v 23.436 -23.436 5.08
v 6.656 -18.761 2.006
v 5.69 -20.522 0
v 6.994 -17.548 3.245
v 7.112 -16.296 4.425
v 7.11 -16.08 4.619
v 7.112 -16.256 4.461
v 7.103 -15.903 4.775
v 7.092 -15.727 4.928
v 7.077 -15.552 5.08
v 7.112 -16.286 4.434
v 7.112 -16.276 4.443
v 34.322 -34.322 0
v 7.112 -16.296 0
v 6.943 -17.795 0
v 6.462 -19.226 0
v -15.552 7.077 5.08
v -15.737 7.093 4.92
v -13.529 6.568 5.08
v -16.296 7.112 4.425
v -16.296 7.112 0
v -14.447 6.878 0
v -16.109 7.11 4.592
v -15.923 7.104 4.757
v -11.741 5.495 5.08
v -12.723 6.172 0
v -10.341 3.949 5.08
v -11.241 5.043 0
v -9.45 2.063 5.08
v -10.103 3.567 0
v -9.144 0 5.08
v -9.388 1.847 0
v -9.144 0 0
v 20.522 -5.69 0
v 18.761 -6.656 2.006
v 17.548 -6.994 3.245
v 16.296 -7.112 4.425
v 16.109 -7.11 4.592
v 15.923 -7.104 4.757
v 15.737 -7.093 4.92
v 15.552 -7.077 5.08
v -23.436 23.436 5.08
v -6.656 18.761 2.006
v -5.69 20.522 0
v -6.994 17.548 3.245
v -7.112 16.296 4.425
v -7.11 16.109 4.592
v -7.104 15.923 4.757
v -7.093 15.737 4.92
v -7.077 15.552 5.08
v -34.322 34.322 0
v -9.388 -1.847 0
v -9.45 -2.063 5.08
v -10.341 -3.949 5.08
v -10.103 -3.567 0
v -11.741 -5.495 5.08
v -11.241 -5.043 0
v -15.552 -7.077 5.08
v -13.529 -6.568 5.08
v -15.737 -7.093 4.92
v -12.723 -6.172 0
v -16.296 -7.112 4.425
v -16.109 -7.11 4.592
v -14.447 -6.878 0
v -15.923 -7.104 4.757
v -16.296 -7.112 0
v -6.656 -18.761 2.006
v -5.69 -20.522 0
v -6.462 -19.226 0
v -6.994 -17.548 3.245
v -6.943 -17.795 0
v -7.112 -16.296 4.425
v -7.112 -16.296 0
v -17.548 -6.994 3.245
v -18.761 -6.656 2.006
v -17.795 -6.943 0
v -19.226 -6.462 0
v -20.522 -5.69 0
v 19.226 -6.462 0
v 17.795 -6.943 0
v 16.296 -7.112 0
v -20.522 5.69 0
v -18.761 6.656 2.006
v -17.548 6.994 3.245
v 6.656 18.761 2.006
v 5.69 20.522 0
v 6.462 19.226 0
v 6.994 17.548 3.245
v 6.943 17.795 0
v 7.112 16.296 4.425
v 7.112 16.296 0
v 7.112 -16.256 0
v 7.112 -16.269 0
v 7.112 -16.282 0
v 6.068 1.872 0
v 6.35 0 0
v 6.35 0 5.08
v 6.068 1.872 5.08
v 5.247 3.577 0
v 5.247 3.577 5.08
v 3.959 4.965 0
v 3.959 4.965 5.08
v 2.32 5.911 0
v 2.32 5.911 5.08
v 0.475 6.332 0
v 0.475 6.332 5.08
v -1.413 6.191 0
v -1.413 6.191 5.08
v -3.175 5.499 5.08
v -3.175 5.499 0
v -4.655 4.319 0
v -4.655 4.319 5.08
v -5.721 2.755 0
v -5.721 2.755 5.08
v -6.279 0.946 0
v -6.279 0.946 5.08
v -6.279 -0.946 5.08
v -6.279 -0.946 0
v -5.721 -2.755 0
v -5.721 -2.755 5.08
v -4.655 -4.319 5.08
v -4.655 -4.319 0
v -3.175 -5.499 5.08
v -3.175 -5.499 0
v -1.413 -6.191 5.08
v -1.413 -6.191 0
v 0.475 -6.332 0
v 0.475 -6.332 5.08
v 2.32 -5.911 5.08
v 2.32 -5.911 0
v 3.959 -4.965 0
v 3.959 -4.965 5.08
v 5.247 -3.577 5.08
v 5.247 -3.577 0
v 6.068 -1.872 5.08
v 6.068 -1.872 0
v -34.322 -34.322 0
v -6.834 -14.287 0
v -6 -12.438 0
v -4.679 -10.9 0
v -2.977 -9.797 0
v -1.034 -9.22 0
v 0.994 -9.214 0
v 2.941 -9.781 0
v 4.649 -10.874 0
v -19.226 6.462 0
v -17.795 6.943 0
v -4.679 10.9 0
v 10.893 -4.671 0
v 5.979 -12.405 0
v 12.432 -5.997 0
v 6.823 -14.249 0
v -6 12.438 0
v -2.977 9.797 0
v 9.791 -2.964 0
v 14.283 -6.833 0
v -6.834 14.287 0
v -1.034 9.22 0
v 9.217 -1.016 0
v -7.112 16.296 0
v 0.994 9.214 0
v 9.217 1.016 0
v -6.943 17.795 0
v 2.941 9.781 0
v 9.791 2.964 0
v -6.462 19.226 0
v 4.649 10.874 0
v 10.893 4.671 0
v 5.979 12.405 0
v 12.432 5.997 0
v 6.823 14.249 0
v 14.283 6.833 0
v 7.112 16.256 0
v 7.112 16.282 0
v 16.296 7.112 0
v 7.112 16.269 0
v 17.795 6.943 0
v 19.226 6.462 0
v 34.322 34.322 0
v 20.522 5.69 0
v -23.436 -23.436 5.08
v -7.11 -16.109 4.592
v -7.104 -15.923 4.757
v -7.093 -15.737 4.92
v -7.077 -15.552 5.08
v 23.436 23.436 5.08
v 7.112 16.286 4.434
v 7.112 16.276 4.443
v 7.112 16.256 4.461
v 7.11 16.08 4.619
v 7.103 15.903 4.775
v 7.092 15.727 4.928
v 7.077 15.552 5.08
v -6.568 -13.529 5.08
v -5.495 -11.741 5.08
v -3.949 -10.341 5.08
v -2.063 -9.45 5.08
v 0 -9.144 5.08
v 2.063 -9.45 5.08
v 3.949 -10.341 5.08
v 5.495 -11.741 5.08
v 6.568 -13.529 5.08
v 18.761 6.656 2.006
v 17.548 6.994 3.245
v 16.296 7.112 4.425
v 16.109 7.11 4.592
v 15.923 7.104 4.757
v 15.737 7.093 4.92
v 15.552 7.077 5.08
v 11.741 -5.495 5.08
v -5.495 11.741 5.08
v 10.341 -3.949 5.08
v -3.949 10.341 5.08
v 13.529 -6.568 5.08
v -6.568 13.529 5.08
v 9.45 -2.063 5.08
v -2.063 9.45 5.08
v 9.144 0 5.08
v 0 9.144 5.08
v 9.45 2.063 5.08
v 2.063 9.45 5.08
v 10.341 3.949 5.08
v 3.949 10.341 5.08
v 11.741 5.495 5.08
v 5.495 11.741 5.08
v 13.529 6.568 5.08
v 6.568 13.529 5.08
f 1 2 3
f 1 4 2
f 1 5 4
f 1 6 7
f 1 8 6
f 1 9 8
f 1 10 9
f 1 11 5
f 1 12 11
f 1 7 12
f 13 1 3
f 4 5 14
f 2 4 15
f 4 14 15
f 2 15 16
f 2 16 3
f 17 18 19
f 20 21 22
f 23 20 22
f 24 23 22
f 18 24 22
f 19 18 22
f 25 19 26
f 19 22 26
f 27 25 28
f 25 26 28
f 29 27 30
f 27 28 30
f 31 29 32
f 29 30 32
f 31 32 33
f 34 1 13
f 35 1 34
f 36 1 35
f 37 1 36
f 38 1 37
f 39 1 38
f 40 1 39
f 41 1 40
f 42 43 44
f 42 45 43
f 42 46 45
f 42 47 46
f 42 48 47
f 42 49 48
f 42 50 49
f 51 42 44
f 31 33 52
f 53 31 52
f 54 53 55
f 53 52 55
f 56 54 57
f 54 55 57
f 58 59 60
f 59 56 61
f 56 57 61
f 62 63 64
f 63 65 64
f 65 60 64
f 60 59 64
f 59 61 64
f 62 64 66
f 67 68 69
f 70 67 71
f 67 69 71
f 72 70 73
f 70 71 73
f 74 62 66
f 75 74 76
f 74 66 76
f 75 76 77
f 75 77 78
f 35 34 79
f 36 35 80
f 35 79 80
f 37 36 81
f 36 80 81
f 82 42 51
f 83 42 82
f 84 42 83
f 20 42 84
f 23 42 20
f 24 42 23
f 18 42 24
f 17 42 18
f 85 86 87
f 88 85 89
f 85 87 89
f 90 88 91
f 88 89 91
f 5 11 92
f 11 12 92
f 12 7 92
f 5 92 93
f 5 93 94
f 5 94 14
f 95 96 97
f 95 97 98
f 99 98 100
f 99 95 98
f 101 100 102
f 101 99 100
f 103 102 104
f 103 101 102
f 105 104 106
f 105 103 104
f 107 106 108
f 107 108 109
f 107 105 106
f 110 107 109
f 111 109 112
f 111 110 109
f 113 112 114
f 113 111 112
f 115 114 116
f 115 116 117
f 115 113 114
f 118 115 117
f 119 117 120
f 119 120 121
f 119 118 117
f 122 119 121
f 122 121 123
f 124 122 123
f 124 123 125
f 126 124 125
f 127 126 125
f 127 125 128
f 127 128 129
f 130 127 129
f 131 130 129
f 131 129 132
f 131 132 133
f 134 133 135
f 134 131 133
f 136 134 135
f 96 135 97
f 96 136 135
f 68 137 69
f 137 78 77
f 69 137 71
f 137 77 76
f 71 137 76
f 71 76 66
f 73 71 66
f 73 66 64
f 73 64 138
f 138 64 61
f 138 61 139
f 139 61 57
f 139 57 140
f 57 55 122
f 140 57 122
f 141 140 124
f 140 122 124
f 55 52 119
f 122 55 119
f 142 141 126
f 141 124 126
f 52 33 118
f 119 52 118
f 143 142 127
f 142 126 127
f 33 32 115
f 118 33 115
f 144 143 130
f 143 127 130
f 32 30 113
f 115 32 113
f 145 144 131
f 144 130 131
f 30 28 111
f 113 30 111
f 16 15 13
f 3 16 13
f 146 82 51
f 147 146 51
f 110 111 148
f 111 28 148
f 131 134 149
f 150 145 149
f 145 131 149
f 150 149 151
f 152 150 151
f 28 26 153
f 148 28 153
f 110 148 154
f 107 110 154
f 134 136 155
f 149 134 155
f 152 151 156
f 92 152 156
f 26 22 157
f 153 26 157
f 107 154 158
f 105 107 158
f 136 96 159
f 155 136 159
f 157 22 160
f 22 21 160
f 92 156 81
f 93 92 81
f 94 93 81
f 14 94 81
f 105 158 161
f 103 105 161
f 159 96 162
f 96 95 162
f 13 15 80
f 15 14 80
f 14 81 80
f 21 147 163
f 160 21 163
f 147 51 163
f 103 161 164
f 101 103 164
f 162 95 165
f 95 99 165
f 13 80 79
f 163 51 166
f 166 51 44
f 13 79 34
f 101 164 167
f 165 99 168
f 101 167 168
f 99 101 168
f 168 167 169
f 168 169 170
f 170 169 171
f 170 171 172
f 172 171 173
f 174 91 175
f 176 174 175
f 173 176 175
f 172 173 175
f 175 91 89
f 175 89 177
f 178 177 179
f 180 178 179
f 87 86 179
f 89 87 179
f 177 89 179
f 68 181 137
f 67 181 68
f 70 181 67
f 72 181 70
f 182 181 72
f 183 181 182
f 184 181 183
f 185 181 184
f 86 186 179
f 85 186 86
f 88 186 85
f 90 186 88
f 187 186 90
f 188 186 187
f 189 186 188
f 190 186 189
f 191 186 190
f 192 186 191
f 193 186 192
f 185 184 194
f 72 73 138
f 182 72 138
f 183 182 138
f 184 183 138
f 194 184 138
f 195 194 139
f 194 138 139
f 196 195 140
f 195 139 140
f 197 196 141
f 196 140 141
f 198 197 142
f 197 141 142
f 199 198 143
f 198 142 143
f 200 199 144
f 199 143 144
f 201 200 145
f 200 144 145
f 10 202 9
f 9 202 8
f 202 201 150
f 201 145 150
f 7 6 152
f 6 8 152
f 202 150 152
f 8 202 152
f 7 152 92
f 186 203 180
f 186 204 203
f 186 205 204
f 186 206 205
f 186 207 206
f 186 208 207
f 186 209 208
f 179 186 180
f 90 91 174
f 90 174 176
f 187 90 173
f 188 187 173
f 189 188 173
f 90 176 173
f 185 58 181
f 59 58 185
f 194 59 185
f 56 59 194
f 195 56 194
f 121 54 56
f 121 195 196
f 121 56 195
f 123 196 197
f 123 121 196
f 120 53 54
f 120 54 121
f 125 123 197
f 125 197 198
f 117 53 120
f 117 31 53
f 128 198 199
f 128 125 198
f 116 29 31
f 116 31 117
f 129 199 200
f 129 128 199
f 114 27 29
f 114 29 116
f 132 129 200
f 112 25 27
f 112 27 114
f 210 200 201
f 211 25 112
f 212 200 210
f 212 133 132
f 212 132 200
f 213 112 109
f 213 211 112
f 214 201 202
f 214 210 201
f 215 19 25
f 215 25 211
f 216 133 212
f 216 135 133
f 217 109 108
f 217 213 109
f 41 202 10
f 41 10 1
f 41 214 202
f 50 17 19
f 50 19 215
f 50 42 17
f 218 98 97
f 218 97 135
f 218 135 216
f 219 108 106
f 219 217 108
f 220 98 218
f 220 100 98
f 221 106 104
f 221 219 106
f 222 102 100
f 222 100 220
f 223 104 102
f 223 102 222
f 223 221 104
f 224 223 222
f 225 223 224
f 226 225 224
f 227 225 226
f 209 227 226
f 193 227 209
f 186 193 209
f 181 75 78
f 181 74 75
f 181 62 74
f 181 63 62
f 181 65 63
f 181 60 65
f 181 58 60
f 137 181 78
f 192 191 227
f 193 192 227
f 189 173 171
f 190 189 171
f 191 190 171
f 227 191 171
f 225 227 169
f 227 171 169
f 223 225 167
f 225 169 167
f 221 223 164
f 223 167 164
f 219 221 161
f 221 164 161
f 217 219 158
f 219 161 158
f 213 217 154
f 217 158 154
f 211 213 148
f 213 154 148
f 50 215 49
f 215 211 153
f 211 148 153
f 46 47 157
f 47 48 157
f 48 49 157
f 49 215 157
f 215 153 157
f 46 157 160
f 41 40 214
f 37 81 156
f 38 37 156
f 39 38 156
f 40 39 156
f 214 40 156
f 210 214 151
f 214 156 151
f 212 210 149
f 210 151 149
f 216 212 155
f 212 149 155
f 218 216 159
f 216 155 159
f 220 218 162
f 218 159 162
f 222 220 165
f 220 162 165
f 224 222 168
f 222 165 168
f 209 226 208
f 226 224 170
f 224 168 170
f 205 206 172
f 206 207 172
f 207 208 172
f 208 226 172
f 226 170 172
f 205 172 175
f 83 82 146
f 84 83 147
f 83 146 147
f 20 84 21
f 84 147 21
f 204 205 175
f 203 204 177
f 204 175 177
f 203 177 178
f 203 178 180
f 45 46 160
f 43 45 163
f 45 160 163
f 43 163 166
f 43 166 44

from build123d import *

# Parameters (mm, degrees)
F0_R     = 6.35
F1_DEPTH = 5.08
F2_SIZE  = 5.07999


# Not quite as in the source:
# - a fillet or chamfer is up to 0.001 mm smaller than in the source, because OpenCascade refuses the exact size


with BuildPart() as f1:
    # F0 (on Top) → F1 (new body)
    with BuildSketch(Plane.XY):
        with BuildLine():
            ThreePointArc((-16.2956875, 7.1118892639), (-12.5723585695, 12.5723585695), (-7.1118892639, 16.2956875))
            ThreePointArc((-7.1118892639, 16.2956875), (-6.7408857543, 18.5233780558), (-5.6901704054, 20.5224393535))
            Line((-5.6901704054, 20.5224393535), (-34.321730181, 34.321730181))
            Line((-34.321730181, 34.321730181), (-20.5224393535, 5.6901704054))
            ThreePointArc((-20.5224393535, 5.6901704054), (-18.5233780558, 6.7408857543), (-16.2956875, 7.1118892639))
        make_face()
        with BuildLine():
            ThreePointArc((16.2956875, -7.1118892639), (9.144, 0), (16.2956875, 7.1118892639))
            ThreePointArc((16.2956875, 7.1118892639), (12.5723585695, 12.5723585695), (7.1118892639, 16.2956875))
            ThreePointArc((7.1118892639, 16.2956875), (7.1119723159, 16.2758438272), (7.112, 16.256))
            ThreePointArc((7.112, 16.256), (-0.0198438272, 9.1440276841), (-7.1118892639, 16.2956875))
            ThreePointArc((-7.1118892639, 16.2956875), (-12.5723585695, 12.5723585695), (-16.2956875, 7.1118892639))
            ThreePointArc((-16.2956875, 7.1118892639), (-11.2411078526, 5.042955557), (-9.144, 0))
            ThreePointArc((-9.144, 0), (-11.2411078526, -5.042955557), (-16.2956875, -7.1118892639))
            ThreePointArc((-16.2956875, -7.1118892639), (-12.5723585695, -12.5723585695), (-7.1118892639, -16.2956875))
            ThreePointArc((-7.1118892639, -16.2956875), (-0.0198438272, -9.1440276841), (7.112, -16.256))
            ThreePointArc((7.112, -16.256), (7.1119723159, -16.2758438272), (7.1118892639, -16.2956875))
            ThreePointArc((7.1118892639, -16.2956875), (12.5723585695, -12.5723585695), (16.2956875, -7.1118892639))
        make_face()
        Circle(F0_R, mode=Mode.SUBTRACT)
        with BuildLine():
            ThreePointArc((7.1118892639, 16.2956875), (12.5723585695, 12.5723585695), (16.2956875, 7.1118892639))
            ThreePointArc((16.2956875, 7.1118892639), (18.5233780558, 6.7408857543), (20.5224393535, 5.6901704054))
            Line((20.5224393535, 5.6901704054), (34.321730181, 34.321730181))
            Line((34.321730181, 34.321730181), (5.6901704054, 20.5224393535))
            ThreePointArc((5.6901704054, 20.5224393535), (6.7408857543, 18.5233780558), (7.1118892639, 16.2956875))
        make_face()
        with BuildLine():
            ThreePointArc((20.5224393535, -5.6901704054), (18.5233780558, -6.7408857543), (16.2956875, -7.1118892639))
            ThreePointArc((16.2956875, -7.1118892639), (12.5723585695, -12.5723585695), (7.1118892639, -16.2956875))
            ThreePointArc((7.1118892639, -16.2956875), (6.7408857543, -18.5233780558), (5.6901704054, -20.5224393535))
            Line((5.6901704054, -20.5224393535), (34.321730181, -34.321730181))
            Line((34.321730181, -34.321730181), (20.5224393535, -5.6901704054))
        make_face()
        with BuildLine():
            ThreePointArc((-5.6901704054, -20.5224393535), (-6.7408857543, -18.5233780558), (-7.1118892639, -16.2956875))
            ThreePointArc((-7.1118892639, -16.2956875), (-12.5723585695, -12.5723585695), (-16.2956875, -7.1118892639))
            ThreePointArc((-16.2956875, -7.1118892639), (-18.5233780558, -6.7408857543), (-20.5224393535, -5.6901704054))
            Line((-20.5224393535, -5.6901704054), (-34.321730181, -34.321730181))
            Line((-34.321730181, -34.321730181), (-5.6901704054, -20.5224393535))
        make_face()
    extrude(amount=F1_DEPTH)

    # F2 (size 5.08 in the source; OpenCascade refuses exactly that, so slightly less here)
    f2_edges = [f1.edges().sort_by_distance(p)[0] for p in [
        (-27.422085, 20.00595, 5.08),
        (-20.00595, 27.422085, 5.08),
        (20.00595, 27.422085, 5.08),
        (27.422085, 20.00595, 5.08),
        (27.422085, -20.00595, 5.08),
        (20.00595, -27.422085, 5.08),
        (-20.00595, -27.422085, 5.08),
        (-27.422085, -20.00595, 5.08),
    ]]
    chamfer(f2_edges, length=F2_SIZE)


solid = f1.part
